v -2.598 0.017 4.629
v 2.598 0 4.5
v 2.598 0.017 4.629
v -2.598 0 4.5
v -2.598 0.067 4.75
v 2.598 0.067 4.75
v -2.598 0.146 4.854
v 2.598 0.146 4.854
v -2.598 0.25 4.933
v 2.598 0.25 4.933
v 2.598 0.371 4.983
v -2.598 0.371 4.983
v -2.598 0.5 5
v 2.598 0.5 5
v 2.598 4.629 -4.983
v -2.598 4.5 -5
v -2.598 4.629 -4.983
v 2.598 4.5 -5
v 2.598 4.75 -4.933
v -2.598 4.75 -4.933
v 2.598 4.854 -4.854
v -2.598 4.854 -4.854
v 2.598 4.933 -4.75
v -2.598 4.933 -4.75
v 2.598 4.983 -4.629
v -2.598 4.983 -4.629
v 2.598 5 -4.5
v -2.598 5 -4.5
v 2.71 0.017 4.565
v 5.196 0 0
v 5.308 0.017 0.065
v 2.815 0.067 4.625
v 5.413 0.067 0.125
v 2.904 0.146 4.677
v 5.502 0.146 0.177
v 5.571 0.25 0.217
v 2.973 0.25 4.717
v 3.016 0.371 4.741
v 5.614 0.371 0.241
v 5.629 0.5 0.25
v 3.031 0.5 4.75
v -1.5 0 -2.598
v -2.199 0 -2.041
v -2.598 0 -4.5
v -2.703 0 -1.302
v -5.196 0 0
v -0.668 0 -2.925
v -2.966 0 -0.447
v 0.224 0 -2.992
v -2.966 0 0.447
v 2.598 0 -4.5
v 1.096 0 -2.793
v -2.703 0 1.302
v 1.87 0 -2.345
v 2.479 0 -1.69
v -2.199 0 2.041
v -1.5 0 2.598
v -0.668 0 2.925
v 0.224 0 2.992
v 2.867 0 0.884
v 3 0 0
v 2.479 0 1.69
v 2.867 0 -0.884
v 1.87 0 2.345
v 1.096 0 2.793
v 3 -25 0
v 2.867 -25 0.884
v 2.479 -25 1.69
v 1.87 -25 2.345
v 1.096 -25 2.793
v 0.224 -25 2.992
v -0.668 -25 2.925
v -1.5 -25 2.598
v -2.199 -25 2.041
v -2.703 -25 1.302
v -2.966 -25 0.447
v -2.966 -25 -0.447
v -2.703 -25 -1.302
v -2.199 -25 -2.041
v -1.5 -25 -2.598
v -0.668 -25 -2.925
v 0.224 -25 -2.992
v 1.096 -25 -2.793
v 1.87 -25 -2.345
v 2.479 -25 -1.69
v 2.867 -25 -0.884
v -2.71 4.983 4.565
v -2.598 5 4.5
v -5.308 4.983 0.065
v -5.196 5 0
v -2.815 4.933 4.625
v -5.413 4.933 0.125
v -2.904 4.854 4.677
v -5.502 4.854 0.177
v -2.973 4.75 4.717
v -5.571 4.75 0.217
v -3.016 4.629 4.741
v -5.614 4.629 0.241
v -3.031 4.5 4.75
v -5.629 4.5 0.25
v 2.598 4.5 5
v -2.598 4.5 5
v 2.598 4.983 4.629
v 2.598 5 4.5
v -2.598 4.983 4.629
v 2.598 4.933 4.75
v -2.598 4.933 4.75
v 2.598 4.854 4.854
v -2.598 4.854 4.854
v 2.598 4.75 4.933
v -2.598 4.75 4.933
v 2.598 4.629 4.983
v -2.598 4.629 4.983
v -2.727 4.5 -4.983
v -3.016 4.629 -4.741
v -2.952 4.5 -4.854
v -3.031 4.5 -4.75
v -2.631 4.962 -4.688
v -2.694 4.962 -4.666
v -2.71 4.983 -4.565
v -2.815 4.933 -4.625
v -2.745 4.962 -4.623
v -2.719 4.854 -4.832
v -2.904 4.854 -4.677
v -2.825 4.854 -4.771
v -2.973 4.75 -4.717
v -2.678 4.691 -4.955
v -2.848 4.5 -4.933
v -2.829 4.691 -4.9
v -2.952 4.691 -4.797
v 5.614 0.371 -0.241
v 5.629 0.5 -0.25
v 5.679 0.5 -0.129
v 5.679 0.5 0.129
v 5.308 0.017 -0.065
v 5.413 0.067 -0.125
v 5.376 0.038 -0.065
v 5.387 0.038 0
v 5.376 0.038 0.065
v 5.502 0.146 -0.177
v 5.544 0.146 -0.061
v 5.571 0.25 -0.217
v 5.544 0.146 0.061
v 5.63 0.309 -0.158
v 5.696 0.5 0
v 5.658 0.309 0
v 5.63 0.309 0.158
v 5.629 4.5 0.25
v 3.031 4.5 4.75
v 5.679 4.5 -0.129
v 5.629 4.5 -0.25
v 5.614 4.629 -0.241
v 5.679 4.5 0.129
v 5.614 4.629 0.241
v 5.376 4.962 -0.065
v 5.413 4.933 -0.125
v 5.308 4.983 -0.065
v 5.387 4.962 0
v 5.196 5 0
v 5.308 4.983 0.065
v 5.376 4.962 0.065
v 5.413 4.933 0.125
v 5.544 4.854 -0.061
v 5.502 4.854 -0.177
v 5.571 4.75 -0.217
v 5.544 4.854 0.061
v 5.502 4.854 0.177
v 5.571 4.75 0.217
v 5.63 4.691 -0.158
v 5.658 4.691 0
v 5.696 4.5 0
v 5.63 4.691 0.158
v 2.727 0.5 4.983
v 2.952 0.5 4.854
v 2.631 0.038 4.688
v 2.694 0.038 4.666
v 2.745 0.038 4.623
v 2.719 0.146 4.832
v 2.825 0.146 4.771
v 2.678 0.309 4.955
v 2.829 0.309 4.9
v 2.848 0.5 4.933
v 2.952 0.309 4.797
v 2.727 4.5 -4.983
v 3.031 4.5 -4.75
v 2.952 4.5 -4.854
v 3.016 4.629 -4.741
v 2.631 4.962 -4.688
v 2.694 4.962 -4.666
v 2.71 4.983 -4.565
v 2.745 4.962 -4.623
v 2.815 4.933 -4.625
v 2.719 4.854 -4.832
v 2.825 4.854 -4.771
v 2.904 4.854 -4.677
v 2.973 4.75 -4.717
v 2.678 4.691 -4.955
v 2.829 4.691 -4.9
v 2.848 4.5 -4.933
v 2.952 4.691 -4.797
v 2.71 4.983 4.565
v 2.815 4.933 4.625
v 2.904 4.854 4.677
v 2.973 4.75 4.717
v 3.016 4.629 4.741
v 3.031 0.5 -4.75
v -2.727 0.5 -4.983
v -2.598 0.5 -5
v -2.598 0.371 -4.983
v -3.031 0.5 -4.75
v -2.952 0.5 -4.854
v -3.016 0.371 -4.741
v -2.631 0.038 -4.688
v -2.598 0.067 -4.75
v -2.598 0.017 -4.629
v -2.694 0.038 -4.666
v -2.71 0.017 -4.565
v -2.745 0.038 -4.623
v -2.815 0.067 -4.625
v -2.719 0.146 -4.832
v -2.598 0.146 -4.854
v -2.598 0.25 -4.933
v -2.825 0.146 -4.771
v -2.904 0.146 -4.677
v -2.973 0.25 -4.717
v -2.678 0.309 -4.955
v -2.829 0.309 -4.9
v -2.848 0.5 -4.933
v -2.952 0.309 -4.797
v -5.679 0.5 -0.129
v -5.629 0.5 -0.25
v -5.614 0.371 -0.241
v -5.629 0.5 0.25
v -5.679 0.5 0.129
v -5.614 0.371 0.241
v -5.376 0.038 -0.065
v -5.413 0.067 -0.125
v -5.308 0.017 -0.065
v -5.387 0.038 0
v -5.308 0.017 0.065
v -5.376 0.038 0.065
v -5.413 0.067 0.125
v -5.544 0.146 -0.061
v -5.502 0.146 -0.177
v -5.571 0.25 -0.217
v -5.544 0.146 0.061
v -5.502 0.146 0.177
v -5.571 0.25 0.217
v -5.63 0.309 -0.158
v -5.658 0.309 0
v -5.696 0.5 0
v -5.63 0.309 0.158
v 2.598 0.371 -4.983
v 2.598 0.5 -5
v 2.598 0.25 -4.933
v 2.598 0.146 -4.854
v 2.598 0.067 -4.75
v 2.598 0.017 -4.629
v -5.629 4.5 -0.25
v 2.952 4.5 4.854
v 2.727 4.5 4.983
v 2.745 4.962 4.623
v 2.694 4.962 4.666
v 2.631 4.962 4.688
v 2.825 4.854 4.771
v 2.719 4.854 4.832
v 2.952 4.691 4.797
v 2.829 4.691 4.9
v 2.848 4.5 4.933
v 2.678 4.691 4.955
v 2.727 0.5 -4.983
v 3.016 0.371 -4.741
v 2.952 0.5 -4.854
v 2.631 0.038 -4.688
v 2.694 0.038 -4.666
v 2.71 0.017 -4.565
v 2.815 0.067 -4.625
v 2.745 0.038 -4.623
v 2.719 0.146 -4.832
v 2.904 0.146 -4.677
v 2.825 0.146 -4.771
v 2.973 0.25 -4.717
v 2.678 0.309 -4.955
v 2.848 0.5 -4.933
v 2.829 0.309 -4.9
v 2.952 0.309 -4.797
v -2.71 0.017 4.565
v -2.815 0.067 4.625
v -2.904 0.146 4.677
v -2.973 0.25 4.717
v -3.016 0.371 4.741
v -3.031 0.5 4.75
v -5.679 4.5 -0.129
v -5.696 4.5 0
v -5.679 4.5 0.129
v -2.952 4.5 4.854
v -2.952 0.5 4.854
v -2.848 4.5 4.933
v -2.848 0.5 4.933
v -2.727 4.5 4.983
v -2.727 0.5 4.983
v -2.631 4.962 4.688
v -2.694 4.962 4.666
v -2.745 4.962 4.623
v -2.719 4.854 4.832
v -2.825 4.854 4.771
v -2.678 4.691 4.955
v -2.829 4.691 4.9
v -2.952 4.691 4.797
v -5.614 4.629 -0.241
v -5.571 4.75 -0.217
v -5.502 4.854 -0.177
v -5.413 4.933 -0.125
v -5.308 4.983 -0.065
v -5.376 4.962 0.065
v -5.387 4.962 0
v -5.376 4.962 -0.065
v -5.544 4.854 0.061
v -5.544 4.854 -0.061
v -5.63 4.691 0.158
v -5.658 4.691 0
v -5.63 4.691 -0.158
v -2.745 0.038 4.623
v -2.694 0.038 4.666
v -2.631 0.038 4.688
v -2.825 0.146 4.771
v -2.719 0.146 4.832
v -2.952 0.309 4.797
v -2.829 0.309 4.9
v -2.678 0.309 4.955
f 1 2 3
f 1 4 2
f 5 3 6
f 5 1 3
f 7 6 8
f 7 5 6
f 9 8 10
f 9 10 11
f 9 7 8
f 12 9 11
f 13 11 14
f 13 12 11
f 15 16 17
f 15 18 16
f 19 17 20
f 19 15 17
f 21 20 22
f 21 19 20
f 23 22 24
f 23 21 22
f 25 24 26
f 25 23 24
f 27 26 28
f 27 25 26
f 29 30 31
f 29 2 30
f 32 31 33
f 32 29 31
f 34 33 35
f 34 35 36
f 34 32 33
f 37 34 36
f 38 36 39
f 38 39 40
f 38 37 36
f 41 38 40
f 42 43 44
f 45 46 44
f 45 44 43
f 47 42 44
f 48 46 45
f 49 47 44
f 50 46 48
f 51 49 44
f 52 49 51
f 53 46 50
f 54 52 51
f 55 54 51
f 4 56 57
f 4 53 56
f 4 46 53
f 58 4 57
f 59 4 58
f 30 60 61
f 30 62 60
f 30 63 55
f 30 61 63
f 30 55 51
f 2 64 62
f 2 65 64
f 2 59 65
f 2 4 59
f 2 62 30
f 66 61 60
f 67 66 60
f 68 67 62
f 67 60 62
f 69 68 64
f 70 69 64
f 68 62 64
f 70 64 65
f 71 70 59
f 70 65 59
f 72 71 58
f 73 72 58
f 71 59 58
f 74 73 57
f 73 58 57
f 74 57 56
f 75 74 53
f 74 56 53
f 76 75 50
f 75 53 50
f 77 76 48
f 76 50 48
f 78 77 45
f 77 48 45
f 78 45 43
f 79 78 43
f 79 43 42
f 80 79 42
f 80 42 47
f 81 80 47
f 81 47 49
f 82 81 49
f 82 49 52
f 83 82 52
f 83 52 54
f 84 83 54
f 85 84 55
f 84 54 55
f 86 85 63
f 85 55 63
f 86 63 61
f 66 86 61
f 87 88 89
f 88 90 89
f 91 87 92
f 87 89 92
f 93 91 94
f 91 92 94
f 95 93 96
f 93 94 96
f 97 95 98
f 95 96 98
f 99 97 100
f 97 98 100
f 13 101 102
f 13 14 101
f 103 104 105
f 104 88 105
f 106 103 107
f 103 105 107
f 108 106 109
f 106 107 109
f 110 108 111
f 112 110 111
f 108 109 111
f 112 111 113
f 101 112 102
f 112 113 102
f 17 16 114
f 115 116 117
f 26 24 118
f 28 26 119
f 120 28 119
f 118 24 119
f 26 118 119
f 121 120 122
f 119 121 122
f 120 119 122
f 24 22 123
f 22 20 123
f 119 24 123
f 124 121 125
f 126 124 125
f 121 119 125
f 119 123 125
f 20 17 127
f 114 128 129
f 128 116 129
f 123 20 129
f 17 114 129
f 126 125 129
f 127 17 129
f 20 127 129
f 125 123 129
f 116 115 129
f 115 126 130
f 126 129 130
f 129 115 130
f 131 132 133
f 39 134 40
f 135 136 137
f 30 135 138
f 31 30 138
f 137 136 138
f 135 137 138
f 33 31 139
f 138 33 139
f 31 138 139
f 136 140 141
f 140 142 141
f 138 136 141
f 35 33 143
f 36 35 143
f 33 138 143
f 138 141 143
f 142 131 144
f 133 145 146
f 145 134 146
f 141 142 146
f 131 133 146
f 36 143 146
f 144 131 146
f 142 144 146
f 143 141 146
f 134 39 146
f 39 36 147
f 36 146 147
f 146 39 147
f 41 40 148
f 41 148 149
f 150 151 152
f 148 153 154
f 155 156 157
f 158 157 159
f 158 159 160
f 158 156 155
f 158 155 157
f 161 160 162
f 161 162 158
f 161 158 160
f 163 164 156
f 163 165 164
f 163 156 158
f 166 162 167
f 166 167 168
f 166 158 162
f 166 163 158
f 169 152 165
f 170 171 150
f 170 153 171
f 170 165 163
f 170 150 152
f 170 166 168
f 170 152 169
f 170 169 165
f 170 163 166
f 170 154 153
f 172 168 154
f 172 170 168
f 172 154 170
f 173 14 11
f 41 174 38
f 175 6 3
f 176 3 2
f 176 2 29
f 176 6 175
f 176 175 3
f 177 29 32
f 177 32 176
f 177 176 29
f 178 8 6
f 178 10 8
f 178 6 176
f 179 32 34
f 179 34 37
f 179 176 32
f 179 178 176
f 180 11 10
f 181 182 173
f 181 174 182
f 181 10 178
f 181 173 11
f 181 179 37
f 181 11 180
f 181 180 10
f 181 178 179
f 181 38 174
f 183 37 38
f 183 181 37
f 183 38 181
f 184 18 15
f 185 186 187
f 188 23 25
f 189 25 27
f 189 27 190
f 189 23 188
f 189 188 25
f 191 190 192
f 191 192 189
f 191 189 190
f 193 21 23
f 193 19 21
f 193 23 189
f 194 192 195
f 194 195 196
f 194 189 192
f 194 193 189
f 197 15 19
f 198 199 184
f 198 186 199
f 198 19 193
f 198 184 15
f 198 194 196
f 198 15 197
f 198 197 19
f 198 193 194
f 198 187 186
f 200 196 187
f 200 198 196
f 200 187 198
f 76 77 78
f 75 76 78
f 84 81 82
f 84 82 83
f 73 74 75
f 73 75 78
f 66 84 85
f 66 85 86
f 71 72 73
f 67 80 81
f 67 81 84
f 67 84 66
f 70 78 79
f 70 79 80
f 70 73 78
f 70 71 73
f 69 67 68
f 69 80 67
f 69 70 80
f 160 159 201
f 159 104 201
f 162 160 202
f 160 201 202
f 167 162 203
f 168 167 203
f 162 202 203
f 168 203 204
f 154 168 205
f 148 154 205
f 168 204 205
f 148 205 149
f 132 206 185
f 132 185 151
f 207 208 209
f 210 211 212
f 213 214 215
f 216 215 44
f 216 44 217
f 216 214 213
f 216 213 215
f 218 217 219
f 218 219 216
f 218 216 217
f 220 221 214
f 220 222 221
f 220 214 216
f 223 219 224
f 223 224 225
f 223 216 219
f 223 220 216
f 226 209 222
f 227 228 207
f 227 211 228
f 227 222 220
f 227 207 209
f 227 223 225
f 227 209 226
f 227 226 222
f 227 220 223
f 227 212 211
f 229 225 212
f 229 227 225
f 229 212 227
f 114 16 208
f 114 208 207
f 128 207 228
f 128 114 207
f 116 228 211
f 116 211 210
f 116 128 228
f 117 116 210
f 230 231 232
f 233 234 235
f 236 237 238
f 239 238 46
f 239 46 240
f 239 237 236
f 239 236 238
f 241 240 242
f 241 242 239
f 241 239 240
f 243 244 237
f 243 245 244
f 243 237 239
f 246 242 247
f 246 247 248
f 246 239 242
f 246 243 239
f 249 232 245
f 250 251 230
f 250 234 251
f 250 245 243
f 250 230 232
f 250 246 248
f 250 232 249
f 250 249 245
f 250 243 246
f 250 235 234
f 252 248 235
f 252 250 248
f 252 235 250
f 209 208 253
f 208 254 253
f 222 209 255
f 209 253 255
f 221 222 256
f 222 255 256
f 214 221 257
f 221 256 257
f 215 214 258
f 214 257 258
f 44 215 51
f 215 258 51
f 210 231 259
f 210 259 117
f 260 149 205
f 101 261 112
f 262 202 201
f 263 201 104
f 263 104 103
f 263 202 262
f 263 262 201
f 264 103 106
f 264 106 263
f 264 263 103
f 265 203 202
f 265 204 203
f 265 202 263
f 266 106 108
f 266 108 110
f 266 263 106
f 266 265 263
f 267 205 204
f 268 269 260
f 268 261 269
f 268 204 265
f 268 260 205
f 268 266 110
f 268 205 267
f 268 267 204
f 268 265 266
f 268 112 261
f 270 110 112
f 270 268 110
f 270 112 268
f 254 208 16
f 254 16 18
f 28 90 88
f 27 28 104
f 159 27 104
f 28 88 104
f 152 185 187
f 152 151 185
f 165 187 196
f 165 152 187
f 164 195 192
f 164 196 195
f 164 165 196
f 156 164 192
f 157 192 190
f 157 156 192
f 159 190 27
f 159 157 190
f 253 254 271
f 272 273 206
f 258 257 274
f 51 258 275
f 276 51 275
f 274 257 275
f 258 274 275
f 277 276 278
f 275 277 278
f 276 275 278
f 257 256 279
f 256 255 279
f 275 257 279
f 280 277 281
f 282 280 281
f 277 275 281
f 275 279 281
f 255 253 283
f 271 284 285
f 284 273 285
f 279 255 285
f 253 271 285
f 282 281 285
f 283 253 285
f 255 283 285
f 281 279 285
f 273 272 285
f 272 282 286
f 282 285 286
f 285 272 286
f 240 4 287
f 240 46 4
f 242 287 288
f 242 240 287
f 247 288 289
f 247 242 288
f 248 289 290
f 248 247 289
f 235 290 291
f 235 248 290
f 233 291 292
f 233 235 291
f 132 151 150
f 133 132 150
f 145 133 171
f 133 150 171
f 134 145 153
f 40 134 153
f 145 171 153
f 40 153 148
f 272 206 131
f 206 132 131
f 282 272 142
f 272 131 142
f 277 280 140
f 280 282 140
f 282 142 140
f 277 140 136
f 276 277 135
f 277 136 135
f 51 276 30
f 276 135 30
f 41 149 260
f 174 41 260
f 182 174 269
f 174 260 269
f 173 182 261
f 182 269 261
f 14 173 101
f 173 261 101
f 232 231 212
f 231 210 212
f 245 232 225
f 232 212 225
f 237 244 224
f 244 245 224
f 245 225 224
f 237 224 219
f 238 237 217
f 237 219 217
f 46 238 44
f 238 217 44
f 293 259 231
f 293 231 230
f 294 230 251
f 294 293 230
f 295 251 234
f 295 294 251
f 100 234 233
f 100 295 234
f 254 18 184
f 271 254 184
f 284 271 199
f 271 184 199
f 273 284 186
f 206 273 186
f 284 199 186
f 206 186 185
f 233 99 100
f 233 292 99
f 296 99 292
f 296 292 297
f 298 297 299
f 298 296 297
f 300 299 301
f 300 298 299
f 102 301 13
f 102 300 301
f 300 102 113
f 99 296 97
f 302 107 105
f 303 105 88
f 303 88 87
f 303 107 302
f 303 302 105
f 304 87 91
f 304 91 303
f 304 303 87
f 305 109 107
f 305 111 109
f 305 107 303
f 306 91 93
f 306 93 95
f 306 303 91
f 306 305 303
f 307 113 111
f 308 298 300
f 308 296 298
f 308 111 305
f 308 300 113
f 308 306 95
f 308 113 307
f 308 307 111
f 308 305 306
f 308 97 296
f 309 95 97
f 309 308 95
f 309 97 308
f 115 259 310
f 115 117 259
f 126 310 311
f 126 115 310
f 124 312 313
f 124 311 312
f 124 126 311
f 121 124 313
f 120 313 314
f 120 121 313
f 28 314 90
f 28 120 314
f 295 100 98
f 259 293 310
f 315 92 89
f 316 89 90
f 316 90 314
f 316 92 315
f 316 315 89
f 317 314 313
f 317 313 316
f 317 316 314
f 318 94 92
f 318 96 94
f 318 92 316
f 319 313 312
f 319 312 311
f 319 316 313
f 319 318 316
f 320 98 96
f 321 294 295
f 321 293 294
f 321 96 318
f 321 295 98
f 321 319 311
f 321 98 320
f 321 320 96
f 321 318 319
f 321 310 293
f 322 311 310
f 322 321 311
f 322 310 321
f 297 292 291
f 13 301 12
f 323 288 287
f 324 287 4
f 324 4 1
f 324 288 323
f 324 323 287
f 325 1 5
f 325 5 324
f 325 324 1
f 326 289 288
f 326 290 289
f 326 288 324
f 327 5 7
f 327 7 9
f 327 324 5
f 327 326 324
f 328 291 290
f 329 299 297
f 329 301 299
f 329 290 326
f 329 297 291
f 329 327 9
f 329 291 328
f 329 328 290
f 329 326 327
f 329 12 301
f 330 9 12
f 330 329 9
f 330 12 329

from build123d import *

# Parameters (mm, degrees)
F0_R     = 3
F1_DEPTH = 25
F2_DEPTH = 5
F3_R     = 0.5


with BuildPart() as f1:
    # F0 (on Front) → F1 (new body)
    with BuildSketch(Plane.XZ):
        Circle(F0_R)
    extrude(amount=F1_DEPTH)

    # F0 (on Front) → F2 (join)
    with BuildSketch(Plane.XZ):
        Polygon((-2.886751, -5), (2.886751, -5), (5.773503, 0), (2.886751, 5), (-2.886751, 5), (-5.773503, 0), align=None)
        Circle(F0_R, mode=Mode.SUBTRACT)
        Circle(F0_R)
    extrude(amount=-F2_DEPTH)

    # F3
    f3_edges = [f1.edges().sort_by_distance(p)[0] for p in [
        (-2.886751, 2.5, -5),
        (2.886751, 2.5, -5),
        (0, 0, -5),
        (0, 5, -5),
        (5.773503, 2.5, 0),
        (4.330127, 0, -2.5),
        (4.330127, 5, -2.5),
        (4.330127, 5, 2.5),
        (0, 5, 5),
        (-4.330127, 5, 2.5),
        (-4.330127, 5, -2.5),
        (-5.773503, 2.5, 0),
        (-4.330127, 0, -2.5),
        (-2.886751, 2.5, 5),
        (-4.330127, 0, 2.5),
        (2.886751, 2.5, 5),
        (0, 0, 5),
        (4.330127, 0, 2.5),
    ]]
    fillet(f3_edges, radius=F3_R)


solid = f1.part
